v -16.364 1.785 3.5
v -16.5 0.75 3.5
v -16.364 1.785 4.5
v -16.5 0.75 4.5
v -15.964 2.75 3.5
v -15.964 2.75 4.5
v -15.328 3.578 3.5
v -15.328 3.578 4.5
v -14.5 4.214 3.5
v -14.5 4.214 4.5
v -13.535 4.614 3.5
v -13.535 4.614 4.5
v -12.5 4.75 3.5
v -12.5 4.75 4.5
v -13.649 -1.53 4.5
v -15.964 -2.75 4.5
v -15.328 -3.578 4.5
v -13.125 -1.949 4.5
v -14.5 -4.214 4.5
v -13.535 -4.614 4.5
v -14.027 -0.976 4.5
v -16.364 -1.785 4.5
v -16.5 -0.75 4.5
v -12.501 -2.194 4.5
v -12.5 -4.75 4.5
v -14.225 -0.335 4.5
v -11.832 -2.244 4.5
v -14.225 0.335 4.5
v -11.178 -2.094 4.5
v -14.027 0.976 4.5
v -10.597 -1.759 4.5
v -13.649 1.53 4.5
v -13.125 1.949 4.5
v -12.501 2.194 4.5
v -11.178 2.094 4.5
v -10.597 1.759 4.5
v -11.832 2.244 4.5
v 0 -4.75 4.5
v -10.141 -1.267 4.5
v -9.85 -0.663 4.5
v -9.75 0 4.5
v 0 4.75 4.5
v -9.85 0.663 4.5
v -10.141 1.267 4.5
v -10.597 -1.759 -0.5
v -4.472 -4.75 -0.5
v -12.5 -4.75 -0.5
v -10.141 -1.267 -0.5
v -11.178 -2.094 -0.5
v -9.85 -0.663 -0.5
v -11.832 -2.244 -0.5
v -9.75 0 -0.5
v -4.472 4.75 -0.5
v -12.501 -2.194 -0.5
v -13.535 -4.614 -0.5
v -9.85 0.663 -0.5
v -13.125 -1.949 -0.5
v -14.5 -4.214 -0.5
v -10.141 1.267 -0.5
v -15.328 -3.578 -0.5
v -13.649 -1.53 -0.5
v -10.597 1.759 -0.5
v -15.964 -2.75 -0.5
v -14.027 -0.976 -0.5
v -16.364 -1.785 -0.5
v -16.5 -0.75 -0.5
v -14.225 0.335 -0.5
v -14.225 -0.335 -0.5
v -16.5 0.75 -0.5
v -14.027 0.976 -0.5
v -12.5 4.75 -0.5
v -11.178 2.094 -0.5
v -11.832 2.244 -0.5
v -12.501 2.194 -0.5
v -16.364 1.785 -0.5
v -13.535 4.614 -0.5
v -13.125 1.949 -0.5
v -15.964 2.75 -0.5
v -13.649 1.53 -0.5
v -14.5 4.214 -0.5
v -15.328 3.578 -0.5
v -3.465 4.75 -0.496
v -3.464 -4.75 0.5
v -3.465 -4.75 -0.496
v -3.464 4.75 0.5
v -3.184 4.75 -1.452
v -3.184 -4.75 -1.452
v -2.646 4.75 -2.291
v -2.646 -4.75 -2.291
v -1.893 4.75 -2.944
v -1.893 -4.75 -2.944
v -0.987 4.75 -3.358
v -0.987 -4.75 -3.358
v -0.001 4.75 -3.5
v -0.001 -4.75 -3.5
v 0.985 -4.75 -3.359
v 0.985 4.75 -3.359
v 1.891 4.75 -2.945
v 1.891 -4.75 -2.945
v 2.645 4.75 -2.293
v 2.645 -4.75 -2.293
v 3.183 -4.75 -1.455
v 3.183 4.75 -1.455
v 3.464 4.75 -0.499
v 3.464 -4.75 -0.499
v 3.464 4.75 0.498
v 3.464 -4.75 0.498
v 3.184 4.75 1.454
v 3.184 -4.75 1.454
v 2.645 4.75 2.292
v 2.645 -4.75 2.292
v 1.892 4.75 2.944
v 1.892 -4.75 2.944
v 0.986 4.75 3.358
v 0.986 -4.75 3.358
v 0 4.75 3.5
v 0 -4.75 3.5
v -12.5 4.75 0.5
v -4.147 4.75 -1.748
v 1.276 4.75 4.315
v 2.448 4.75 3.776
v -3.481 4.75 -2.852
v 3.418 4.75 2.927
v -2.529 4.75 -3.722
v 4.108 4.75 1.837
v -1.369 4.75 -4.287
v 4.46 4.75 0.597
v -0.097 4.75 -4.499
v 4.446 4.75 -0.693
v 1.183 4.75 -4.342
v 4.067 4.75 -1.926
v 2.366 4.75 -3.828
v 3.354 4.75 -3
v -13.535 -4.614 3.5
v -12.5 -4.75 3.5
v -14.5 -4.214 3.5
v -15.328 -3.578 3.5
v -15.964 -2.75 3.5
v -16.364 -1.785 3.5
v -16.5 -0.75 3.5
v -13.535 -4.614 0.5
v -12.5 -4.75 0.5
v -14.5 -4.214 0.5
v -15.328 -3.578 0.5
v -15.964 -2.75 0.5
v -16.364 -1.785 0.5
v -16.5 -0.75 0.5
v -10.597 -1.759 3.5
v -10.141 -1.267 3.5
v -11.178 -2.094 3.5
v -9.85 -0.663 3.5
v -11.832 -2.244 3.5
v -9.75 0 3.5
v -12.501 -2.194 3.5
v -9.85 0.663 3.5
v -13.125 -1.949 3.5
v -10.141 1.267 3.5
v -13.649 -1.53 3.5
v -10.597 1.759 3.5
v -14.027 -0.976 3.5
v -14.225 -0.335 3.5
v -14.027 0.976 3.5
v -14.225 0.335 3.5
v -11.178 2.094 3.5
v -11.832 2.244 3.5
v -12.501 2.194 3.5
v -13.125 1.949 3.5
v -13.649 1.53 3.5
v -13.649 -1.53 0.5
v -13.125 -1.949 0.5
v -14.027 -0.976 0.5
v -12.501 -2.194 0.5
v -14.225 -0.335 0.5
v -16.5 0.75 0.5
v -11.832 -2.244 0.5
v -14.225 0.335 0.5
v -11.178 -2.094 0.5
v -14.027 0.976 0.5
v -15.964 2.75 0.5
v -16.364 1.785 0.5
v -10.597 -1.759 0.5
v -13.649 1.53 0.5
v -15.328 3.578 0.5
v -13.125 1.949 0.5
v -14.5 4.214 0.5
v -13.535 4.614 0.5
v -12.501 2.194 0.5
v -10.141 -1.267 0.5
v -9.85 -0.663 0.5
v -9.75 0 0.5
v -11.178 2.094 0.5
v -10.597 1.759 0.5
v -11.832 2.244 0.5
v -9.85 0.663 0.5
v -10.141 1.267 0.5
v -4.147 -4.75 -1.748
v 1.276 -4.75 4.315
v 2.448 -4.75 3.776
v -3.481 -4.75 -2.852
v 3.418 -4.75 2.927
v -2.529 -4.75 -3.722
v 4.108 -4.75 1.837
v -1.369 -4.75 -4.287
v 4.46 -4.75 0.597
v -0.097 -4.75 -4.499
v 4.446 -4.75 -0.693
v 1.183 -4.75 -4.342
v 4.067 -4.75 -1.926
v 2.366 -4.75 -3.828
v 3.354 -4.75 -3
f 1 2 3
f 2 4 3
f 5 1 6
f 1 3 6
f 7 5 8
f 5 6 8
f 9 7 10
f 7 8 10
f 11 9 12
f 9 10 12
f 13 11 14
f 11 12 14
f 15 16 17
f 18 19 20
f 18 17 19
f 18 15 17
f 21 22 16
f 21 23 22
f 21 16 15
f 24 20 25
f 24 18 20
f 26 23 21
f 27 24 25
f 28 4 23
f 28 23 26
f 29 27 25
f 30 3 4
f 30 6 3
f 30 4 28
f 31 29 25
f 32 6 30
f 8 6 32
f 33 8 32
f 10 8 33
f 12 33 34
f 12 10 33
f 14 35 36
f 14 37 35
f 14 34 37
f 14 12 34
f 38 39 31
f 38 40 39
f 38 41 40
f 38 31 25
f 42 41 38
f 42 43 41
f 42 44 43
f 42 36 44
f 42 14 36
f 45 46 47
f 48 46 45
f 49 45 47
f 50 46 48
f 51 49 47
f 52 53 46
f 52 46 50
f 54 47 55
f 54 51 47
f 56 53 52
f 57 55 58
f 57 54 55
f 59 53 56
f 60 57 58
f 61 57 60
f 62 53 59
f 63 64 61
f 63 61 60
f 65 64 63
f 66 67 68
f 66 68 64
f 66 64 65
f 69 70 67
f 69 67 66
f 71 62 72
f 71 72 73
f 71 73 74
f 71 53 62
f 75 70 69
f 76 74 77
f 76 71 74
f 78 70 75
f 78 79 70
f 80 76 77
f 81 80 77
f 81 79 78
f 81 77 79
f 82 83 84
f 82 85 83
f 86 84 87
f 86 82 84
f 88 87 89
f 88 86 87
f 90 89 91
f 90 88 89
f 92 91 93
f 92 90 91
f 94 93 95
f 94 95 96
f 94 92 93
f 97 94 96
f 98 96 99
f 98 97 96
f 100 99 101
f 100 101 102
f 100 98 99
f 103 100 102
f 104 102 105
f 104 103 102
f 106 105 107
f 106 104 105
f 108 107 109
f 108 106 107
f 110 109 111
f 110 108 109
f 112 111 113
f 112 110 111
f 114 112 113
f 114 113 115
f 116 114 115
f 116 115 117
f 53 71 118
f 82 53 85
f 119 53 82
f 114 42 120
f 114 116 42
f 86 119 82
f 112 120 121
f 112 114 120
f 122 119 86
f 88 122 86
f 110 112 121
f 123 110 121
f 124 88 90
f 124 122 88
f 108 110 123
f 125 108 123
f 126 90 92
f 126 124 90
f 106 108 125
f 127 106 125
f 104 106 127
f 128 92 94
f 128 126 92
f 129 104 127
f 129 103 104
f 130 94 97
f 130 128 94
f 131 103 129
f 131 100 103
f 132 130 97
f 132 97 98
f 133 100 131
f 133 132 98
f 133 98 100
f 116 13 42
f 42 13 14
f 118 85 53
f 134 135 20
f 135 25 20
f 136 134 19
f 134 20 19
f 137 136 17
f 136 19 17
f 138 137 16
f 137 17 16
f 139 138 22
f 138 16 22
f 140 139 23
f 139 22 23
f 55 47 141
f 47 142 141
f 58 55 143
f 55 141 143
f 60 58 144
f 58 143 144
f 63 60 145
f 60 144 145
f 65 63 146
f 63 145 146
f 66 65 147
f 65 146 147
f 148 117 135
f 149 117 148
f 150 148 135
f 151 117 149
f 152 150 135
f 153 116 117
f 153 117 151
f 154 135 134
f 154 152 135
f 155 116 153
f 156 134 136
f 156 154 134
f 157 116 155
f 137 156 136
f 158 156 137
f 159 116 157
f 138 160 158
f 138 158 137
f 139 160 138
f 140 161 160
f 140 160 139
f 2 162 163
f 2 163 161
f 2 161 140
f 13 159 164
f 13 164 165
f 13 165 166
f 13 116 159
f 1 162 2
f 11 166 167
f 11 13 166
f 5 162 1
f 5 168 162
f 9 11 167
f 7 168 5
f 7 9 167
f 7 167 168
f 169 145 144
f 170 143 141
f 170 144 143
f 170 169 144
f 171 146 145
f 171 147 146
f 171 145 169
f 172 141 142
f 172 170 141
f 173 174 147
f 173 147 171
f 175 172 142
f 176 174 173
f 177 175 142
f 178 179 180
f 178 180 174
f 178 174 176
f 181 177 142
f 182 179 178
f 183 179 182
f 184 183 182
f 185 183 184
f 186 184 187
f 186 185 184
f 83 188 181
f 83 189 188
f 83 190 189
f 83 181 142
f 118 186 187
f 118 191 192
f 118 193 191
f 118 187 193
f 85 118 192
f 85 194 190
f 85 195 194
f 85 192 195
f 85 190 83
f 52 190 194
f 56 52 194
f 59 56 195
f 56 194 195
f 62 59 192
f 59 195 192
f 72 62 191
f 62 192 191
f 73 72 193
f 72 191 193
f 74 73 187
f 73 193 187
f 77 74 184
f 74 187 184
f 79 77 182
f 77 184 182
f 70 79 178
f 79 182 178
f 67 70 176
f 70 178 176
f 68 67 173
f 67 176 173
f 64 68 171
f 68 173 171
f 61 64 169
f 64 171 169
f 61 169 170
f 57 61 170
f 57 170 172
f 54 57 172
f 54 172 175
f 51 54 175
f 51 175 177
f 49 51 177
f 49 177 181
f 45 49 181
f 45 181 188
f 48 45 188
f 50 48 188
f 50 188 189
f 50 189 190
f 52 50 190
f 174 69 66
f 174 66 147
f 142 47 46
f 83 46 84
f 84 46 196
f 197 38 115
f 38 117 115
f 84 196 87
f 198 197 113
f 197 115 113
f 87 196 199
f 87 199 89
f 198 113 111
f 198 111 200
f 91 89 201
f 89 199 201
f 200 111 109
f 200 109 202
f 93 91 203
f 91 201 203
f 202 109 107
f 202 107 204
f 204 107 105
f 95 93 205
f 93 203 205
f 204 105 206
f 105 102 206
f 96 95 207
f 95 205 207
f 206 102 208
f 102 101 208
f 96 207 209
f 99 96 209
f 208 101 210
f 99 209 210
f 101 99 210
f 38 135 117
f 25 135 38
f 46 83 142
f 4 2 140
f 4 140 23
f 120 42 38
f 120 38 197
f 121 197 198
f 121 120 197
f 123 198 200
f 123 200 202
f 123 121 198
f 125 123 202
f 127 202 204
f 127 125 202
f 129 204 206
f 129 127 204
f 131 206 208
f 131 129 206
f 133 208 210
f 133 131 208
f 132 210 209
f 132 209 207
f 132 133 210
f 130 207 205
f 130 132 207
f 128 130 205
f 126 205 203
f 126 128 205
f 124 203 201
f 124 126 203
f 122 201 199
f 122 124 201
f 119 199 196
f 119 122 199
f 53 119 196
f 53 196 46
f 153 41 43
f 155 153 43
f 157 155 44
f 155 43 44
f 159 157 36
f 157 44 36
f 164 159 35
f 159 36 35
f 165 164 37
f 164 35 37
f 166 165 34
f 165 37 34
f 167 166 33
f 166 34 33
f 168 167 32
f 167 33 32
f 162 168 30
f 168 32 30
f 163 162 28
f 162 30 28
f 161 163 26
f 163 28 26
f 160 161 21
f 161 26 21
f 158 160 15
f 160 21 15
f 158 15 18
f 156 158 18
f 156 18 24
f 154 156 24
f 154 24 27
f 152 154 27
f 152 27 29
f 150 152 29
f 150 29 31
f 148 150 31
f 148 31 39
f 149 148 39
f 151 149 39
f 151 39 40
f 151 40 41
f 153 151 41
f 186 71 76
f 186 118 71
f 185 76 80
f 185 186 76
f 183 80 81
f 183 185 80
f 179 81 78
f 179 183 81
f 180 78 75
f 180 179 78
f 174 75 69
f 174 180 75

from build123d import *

# Parameters (mm, degrees)
BOSS_EXTRUDE1_DEPTH = 4.75
SKETCH2_R           = 2.25
CUT_EXTRUDE1_DEPTH  = 10
FILLET1_R           = 4


with BuildPart() as part:
    # Sketch1 → Boss-Extrude1 (new body, symmetric)
    with BuildSketch(Plane(origin=(0, 0, 0), x_dir=(1, 0, 0), z_dir=(0, 1, 0))):
        with BuildLine():
            Line((0, -3.5), (-16.5, -3.5))
            Line((-16.5, -3.5), (-16.5, -4.5))
            Line((-16.5, -4.5), (0, -4.5))
            ThreePointArc((0, -4.5), (3.354101966, 3), (-4.472135955, 0.5))
            Line((-4.472135955, 0.5), (-16.5, 0.5))
            Line((-16.5, 0.5), (-16.5, -0.5))
            Line((-16.5, -0.5), (-3.464101615, -0.5))
            ThreePointArc((-3.464101615, -0.5), (2.291287847, 2.645751311), (0, -3.5))
        make_face()
    extrude(amount=BOSS_EXTRUDE1_DEPTH, both=True)

    # Sketch2 → Cut-Extrude1 (cut, through all)
    with BuildSketch(Plane.XY.offset(4.5)):
        with Locations((-12, 0)):
            Circle(SKETCH2_R)
    extrude(amount=-CUT_EXTRUDE1_DEPTH, mode=Mode.SUBTRACT)

    # Fillet1
    fillet1_edges = [part.edges().sort_by_distance(p)[0] for p in [
        (-16.5, 4.75, 4),
        (-16.5, 4.75, 0),
        (-16.5, -4.75, 0),
        (-16.5, -4.75, 4),
    ]]
    fillet(fillet1_edges, radius=FILLET1_R)


solid = part.part
